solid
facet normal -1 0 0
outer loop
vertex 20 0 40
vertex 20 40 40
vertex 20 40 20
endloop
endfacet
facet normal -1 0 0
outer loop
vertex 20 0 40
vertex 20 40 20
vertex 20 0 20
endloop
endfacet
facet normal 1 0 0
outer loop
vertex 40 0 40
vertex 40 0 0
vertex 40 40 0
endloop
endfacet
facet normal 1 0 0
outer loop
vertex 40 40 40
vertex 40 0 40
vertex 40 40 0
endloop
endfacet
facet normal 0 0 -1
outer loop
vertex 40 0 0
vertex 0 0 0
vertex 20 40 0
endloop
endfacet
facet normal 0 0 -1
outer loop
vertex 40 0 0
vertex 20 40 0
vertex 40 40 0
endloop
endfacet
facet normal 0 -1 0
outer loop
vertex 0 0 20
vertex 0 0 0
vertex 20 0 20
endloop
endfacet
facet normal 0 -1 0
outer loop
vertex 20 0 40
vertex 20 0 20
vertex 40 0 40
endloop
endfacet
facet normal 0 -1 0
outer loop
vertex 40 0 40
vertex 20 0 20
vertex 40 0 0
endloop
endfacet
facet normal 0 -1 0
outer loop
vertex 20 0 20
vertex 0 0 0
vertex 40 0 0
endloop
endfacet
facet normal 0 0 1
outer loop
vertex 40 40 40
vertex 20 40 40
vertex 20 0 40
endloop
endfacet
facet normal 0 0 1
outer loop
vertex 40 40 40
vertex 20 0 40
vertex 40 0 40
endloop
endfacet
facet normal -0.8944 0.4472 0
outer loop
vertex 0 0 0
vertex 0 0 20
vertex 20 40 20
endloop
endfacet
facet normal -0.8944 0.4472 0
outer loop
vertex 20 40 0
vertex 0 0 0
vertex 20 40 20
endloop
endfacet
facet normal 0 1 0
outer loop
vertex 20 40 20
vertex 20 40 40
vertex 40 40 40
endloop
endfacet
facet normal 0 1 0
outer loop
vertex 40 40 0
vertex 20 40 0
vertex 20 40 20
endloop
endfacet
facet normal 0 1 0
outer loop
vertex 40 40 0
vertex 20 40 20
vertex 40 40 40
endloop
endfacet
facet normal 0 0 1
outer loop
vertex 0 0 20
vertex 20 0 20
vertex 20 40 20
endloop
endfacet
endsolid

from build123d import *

# Parameters (mm, degrees)
SKETCH1_W           = 40
SKETCH1_H           = 40
BOSS_EXTRUDE1_DEPTH = 40
CUT_EXTRUDE1_DEPTH  = 40
CUT_EXTRUDE2_DEPTH  = 20


with BuildPart() as part:
    # Sketch1 → Boss-Extrude1 (new body)
    with BuildSketch(Plane.XY):
        with Locations((20, 20)):
            Rectangle(SKETCH1_W, SKETCH1_H)
    extrude(amount=BOSS_EXTRUDE1_DEPTH)

    # Sketch2 → Cut-Extrude1 (cut)
    with BuildSketch(Plane.XY.offset(40)):
        Polygon((0, 0), (20, 40), (0, 40), align=None)
    extrude(amount=-CUT_EXTRUDE1_DEPTH, mode=Mode.SUBTRACT)

    # Sketch3 → Cut-Extrude2 (cut)
    with BuildSketch(Plane.XY.offset(40)):
        Polygon((20, 40), (20, 0), (0, 0), align=None)
    extrude(amount=-CUT_EXTRUDE2_DEPTH, mode=Mode.SUBTRACT)


solid = part.part
